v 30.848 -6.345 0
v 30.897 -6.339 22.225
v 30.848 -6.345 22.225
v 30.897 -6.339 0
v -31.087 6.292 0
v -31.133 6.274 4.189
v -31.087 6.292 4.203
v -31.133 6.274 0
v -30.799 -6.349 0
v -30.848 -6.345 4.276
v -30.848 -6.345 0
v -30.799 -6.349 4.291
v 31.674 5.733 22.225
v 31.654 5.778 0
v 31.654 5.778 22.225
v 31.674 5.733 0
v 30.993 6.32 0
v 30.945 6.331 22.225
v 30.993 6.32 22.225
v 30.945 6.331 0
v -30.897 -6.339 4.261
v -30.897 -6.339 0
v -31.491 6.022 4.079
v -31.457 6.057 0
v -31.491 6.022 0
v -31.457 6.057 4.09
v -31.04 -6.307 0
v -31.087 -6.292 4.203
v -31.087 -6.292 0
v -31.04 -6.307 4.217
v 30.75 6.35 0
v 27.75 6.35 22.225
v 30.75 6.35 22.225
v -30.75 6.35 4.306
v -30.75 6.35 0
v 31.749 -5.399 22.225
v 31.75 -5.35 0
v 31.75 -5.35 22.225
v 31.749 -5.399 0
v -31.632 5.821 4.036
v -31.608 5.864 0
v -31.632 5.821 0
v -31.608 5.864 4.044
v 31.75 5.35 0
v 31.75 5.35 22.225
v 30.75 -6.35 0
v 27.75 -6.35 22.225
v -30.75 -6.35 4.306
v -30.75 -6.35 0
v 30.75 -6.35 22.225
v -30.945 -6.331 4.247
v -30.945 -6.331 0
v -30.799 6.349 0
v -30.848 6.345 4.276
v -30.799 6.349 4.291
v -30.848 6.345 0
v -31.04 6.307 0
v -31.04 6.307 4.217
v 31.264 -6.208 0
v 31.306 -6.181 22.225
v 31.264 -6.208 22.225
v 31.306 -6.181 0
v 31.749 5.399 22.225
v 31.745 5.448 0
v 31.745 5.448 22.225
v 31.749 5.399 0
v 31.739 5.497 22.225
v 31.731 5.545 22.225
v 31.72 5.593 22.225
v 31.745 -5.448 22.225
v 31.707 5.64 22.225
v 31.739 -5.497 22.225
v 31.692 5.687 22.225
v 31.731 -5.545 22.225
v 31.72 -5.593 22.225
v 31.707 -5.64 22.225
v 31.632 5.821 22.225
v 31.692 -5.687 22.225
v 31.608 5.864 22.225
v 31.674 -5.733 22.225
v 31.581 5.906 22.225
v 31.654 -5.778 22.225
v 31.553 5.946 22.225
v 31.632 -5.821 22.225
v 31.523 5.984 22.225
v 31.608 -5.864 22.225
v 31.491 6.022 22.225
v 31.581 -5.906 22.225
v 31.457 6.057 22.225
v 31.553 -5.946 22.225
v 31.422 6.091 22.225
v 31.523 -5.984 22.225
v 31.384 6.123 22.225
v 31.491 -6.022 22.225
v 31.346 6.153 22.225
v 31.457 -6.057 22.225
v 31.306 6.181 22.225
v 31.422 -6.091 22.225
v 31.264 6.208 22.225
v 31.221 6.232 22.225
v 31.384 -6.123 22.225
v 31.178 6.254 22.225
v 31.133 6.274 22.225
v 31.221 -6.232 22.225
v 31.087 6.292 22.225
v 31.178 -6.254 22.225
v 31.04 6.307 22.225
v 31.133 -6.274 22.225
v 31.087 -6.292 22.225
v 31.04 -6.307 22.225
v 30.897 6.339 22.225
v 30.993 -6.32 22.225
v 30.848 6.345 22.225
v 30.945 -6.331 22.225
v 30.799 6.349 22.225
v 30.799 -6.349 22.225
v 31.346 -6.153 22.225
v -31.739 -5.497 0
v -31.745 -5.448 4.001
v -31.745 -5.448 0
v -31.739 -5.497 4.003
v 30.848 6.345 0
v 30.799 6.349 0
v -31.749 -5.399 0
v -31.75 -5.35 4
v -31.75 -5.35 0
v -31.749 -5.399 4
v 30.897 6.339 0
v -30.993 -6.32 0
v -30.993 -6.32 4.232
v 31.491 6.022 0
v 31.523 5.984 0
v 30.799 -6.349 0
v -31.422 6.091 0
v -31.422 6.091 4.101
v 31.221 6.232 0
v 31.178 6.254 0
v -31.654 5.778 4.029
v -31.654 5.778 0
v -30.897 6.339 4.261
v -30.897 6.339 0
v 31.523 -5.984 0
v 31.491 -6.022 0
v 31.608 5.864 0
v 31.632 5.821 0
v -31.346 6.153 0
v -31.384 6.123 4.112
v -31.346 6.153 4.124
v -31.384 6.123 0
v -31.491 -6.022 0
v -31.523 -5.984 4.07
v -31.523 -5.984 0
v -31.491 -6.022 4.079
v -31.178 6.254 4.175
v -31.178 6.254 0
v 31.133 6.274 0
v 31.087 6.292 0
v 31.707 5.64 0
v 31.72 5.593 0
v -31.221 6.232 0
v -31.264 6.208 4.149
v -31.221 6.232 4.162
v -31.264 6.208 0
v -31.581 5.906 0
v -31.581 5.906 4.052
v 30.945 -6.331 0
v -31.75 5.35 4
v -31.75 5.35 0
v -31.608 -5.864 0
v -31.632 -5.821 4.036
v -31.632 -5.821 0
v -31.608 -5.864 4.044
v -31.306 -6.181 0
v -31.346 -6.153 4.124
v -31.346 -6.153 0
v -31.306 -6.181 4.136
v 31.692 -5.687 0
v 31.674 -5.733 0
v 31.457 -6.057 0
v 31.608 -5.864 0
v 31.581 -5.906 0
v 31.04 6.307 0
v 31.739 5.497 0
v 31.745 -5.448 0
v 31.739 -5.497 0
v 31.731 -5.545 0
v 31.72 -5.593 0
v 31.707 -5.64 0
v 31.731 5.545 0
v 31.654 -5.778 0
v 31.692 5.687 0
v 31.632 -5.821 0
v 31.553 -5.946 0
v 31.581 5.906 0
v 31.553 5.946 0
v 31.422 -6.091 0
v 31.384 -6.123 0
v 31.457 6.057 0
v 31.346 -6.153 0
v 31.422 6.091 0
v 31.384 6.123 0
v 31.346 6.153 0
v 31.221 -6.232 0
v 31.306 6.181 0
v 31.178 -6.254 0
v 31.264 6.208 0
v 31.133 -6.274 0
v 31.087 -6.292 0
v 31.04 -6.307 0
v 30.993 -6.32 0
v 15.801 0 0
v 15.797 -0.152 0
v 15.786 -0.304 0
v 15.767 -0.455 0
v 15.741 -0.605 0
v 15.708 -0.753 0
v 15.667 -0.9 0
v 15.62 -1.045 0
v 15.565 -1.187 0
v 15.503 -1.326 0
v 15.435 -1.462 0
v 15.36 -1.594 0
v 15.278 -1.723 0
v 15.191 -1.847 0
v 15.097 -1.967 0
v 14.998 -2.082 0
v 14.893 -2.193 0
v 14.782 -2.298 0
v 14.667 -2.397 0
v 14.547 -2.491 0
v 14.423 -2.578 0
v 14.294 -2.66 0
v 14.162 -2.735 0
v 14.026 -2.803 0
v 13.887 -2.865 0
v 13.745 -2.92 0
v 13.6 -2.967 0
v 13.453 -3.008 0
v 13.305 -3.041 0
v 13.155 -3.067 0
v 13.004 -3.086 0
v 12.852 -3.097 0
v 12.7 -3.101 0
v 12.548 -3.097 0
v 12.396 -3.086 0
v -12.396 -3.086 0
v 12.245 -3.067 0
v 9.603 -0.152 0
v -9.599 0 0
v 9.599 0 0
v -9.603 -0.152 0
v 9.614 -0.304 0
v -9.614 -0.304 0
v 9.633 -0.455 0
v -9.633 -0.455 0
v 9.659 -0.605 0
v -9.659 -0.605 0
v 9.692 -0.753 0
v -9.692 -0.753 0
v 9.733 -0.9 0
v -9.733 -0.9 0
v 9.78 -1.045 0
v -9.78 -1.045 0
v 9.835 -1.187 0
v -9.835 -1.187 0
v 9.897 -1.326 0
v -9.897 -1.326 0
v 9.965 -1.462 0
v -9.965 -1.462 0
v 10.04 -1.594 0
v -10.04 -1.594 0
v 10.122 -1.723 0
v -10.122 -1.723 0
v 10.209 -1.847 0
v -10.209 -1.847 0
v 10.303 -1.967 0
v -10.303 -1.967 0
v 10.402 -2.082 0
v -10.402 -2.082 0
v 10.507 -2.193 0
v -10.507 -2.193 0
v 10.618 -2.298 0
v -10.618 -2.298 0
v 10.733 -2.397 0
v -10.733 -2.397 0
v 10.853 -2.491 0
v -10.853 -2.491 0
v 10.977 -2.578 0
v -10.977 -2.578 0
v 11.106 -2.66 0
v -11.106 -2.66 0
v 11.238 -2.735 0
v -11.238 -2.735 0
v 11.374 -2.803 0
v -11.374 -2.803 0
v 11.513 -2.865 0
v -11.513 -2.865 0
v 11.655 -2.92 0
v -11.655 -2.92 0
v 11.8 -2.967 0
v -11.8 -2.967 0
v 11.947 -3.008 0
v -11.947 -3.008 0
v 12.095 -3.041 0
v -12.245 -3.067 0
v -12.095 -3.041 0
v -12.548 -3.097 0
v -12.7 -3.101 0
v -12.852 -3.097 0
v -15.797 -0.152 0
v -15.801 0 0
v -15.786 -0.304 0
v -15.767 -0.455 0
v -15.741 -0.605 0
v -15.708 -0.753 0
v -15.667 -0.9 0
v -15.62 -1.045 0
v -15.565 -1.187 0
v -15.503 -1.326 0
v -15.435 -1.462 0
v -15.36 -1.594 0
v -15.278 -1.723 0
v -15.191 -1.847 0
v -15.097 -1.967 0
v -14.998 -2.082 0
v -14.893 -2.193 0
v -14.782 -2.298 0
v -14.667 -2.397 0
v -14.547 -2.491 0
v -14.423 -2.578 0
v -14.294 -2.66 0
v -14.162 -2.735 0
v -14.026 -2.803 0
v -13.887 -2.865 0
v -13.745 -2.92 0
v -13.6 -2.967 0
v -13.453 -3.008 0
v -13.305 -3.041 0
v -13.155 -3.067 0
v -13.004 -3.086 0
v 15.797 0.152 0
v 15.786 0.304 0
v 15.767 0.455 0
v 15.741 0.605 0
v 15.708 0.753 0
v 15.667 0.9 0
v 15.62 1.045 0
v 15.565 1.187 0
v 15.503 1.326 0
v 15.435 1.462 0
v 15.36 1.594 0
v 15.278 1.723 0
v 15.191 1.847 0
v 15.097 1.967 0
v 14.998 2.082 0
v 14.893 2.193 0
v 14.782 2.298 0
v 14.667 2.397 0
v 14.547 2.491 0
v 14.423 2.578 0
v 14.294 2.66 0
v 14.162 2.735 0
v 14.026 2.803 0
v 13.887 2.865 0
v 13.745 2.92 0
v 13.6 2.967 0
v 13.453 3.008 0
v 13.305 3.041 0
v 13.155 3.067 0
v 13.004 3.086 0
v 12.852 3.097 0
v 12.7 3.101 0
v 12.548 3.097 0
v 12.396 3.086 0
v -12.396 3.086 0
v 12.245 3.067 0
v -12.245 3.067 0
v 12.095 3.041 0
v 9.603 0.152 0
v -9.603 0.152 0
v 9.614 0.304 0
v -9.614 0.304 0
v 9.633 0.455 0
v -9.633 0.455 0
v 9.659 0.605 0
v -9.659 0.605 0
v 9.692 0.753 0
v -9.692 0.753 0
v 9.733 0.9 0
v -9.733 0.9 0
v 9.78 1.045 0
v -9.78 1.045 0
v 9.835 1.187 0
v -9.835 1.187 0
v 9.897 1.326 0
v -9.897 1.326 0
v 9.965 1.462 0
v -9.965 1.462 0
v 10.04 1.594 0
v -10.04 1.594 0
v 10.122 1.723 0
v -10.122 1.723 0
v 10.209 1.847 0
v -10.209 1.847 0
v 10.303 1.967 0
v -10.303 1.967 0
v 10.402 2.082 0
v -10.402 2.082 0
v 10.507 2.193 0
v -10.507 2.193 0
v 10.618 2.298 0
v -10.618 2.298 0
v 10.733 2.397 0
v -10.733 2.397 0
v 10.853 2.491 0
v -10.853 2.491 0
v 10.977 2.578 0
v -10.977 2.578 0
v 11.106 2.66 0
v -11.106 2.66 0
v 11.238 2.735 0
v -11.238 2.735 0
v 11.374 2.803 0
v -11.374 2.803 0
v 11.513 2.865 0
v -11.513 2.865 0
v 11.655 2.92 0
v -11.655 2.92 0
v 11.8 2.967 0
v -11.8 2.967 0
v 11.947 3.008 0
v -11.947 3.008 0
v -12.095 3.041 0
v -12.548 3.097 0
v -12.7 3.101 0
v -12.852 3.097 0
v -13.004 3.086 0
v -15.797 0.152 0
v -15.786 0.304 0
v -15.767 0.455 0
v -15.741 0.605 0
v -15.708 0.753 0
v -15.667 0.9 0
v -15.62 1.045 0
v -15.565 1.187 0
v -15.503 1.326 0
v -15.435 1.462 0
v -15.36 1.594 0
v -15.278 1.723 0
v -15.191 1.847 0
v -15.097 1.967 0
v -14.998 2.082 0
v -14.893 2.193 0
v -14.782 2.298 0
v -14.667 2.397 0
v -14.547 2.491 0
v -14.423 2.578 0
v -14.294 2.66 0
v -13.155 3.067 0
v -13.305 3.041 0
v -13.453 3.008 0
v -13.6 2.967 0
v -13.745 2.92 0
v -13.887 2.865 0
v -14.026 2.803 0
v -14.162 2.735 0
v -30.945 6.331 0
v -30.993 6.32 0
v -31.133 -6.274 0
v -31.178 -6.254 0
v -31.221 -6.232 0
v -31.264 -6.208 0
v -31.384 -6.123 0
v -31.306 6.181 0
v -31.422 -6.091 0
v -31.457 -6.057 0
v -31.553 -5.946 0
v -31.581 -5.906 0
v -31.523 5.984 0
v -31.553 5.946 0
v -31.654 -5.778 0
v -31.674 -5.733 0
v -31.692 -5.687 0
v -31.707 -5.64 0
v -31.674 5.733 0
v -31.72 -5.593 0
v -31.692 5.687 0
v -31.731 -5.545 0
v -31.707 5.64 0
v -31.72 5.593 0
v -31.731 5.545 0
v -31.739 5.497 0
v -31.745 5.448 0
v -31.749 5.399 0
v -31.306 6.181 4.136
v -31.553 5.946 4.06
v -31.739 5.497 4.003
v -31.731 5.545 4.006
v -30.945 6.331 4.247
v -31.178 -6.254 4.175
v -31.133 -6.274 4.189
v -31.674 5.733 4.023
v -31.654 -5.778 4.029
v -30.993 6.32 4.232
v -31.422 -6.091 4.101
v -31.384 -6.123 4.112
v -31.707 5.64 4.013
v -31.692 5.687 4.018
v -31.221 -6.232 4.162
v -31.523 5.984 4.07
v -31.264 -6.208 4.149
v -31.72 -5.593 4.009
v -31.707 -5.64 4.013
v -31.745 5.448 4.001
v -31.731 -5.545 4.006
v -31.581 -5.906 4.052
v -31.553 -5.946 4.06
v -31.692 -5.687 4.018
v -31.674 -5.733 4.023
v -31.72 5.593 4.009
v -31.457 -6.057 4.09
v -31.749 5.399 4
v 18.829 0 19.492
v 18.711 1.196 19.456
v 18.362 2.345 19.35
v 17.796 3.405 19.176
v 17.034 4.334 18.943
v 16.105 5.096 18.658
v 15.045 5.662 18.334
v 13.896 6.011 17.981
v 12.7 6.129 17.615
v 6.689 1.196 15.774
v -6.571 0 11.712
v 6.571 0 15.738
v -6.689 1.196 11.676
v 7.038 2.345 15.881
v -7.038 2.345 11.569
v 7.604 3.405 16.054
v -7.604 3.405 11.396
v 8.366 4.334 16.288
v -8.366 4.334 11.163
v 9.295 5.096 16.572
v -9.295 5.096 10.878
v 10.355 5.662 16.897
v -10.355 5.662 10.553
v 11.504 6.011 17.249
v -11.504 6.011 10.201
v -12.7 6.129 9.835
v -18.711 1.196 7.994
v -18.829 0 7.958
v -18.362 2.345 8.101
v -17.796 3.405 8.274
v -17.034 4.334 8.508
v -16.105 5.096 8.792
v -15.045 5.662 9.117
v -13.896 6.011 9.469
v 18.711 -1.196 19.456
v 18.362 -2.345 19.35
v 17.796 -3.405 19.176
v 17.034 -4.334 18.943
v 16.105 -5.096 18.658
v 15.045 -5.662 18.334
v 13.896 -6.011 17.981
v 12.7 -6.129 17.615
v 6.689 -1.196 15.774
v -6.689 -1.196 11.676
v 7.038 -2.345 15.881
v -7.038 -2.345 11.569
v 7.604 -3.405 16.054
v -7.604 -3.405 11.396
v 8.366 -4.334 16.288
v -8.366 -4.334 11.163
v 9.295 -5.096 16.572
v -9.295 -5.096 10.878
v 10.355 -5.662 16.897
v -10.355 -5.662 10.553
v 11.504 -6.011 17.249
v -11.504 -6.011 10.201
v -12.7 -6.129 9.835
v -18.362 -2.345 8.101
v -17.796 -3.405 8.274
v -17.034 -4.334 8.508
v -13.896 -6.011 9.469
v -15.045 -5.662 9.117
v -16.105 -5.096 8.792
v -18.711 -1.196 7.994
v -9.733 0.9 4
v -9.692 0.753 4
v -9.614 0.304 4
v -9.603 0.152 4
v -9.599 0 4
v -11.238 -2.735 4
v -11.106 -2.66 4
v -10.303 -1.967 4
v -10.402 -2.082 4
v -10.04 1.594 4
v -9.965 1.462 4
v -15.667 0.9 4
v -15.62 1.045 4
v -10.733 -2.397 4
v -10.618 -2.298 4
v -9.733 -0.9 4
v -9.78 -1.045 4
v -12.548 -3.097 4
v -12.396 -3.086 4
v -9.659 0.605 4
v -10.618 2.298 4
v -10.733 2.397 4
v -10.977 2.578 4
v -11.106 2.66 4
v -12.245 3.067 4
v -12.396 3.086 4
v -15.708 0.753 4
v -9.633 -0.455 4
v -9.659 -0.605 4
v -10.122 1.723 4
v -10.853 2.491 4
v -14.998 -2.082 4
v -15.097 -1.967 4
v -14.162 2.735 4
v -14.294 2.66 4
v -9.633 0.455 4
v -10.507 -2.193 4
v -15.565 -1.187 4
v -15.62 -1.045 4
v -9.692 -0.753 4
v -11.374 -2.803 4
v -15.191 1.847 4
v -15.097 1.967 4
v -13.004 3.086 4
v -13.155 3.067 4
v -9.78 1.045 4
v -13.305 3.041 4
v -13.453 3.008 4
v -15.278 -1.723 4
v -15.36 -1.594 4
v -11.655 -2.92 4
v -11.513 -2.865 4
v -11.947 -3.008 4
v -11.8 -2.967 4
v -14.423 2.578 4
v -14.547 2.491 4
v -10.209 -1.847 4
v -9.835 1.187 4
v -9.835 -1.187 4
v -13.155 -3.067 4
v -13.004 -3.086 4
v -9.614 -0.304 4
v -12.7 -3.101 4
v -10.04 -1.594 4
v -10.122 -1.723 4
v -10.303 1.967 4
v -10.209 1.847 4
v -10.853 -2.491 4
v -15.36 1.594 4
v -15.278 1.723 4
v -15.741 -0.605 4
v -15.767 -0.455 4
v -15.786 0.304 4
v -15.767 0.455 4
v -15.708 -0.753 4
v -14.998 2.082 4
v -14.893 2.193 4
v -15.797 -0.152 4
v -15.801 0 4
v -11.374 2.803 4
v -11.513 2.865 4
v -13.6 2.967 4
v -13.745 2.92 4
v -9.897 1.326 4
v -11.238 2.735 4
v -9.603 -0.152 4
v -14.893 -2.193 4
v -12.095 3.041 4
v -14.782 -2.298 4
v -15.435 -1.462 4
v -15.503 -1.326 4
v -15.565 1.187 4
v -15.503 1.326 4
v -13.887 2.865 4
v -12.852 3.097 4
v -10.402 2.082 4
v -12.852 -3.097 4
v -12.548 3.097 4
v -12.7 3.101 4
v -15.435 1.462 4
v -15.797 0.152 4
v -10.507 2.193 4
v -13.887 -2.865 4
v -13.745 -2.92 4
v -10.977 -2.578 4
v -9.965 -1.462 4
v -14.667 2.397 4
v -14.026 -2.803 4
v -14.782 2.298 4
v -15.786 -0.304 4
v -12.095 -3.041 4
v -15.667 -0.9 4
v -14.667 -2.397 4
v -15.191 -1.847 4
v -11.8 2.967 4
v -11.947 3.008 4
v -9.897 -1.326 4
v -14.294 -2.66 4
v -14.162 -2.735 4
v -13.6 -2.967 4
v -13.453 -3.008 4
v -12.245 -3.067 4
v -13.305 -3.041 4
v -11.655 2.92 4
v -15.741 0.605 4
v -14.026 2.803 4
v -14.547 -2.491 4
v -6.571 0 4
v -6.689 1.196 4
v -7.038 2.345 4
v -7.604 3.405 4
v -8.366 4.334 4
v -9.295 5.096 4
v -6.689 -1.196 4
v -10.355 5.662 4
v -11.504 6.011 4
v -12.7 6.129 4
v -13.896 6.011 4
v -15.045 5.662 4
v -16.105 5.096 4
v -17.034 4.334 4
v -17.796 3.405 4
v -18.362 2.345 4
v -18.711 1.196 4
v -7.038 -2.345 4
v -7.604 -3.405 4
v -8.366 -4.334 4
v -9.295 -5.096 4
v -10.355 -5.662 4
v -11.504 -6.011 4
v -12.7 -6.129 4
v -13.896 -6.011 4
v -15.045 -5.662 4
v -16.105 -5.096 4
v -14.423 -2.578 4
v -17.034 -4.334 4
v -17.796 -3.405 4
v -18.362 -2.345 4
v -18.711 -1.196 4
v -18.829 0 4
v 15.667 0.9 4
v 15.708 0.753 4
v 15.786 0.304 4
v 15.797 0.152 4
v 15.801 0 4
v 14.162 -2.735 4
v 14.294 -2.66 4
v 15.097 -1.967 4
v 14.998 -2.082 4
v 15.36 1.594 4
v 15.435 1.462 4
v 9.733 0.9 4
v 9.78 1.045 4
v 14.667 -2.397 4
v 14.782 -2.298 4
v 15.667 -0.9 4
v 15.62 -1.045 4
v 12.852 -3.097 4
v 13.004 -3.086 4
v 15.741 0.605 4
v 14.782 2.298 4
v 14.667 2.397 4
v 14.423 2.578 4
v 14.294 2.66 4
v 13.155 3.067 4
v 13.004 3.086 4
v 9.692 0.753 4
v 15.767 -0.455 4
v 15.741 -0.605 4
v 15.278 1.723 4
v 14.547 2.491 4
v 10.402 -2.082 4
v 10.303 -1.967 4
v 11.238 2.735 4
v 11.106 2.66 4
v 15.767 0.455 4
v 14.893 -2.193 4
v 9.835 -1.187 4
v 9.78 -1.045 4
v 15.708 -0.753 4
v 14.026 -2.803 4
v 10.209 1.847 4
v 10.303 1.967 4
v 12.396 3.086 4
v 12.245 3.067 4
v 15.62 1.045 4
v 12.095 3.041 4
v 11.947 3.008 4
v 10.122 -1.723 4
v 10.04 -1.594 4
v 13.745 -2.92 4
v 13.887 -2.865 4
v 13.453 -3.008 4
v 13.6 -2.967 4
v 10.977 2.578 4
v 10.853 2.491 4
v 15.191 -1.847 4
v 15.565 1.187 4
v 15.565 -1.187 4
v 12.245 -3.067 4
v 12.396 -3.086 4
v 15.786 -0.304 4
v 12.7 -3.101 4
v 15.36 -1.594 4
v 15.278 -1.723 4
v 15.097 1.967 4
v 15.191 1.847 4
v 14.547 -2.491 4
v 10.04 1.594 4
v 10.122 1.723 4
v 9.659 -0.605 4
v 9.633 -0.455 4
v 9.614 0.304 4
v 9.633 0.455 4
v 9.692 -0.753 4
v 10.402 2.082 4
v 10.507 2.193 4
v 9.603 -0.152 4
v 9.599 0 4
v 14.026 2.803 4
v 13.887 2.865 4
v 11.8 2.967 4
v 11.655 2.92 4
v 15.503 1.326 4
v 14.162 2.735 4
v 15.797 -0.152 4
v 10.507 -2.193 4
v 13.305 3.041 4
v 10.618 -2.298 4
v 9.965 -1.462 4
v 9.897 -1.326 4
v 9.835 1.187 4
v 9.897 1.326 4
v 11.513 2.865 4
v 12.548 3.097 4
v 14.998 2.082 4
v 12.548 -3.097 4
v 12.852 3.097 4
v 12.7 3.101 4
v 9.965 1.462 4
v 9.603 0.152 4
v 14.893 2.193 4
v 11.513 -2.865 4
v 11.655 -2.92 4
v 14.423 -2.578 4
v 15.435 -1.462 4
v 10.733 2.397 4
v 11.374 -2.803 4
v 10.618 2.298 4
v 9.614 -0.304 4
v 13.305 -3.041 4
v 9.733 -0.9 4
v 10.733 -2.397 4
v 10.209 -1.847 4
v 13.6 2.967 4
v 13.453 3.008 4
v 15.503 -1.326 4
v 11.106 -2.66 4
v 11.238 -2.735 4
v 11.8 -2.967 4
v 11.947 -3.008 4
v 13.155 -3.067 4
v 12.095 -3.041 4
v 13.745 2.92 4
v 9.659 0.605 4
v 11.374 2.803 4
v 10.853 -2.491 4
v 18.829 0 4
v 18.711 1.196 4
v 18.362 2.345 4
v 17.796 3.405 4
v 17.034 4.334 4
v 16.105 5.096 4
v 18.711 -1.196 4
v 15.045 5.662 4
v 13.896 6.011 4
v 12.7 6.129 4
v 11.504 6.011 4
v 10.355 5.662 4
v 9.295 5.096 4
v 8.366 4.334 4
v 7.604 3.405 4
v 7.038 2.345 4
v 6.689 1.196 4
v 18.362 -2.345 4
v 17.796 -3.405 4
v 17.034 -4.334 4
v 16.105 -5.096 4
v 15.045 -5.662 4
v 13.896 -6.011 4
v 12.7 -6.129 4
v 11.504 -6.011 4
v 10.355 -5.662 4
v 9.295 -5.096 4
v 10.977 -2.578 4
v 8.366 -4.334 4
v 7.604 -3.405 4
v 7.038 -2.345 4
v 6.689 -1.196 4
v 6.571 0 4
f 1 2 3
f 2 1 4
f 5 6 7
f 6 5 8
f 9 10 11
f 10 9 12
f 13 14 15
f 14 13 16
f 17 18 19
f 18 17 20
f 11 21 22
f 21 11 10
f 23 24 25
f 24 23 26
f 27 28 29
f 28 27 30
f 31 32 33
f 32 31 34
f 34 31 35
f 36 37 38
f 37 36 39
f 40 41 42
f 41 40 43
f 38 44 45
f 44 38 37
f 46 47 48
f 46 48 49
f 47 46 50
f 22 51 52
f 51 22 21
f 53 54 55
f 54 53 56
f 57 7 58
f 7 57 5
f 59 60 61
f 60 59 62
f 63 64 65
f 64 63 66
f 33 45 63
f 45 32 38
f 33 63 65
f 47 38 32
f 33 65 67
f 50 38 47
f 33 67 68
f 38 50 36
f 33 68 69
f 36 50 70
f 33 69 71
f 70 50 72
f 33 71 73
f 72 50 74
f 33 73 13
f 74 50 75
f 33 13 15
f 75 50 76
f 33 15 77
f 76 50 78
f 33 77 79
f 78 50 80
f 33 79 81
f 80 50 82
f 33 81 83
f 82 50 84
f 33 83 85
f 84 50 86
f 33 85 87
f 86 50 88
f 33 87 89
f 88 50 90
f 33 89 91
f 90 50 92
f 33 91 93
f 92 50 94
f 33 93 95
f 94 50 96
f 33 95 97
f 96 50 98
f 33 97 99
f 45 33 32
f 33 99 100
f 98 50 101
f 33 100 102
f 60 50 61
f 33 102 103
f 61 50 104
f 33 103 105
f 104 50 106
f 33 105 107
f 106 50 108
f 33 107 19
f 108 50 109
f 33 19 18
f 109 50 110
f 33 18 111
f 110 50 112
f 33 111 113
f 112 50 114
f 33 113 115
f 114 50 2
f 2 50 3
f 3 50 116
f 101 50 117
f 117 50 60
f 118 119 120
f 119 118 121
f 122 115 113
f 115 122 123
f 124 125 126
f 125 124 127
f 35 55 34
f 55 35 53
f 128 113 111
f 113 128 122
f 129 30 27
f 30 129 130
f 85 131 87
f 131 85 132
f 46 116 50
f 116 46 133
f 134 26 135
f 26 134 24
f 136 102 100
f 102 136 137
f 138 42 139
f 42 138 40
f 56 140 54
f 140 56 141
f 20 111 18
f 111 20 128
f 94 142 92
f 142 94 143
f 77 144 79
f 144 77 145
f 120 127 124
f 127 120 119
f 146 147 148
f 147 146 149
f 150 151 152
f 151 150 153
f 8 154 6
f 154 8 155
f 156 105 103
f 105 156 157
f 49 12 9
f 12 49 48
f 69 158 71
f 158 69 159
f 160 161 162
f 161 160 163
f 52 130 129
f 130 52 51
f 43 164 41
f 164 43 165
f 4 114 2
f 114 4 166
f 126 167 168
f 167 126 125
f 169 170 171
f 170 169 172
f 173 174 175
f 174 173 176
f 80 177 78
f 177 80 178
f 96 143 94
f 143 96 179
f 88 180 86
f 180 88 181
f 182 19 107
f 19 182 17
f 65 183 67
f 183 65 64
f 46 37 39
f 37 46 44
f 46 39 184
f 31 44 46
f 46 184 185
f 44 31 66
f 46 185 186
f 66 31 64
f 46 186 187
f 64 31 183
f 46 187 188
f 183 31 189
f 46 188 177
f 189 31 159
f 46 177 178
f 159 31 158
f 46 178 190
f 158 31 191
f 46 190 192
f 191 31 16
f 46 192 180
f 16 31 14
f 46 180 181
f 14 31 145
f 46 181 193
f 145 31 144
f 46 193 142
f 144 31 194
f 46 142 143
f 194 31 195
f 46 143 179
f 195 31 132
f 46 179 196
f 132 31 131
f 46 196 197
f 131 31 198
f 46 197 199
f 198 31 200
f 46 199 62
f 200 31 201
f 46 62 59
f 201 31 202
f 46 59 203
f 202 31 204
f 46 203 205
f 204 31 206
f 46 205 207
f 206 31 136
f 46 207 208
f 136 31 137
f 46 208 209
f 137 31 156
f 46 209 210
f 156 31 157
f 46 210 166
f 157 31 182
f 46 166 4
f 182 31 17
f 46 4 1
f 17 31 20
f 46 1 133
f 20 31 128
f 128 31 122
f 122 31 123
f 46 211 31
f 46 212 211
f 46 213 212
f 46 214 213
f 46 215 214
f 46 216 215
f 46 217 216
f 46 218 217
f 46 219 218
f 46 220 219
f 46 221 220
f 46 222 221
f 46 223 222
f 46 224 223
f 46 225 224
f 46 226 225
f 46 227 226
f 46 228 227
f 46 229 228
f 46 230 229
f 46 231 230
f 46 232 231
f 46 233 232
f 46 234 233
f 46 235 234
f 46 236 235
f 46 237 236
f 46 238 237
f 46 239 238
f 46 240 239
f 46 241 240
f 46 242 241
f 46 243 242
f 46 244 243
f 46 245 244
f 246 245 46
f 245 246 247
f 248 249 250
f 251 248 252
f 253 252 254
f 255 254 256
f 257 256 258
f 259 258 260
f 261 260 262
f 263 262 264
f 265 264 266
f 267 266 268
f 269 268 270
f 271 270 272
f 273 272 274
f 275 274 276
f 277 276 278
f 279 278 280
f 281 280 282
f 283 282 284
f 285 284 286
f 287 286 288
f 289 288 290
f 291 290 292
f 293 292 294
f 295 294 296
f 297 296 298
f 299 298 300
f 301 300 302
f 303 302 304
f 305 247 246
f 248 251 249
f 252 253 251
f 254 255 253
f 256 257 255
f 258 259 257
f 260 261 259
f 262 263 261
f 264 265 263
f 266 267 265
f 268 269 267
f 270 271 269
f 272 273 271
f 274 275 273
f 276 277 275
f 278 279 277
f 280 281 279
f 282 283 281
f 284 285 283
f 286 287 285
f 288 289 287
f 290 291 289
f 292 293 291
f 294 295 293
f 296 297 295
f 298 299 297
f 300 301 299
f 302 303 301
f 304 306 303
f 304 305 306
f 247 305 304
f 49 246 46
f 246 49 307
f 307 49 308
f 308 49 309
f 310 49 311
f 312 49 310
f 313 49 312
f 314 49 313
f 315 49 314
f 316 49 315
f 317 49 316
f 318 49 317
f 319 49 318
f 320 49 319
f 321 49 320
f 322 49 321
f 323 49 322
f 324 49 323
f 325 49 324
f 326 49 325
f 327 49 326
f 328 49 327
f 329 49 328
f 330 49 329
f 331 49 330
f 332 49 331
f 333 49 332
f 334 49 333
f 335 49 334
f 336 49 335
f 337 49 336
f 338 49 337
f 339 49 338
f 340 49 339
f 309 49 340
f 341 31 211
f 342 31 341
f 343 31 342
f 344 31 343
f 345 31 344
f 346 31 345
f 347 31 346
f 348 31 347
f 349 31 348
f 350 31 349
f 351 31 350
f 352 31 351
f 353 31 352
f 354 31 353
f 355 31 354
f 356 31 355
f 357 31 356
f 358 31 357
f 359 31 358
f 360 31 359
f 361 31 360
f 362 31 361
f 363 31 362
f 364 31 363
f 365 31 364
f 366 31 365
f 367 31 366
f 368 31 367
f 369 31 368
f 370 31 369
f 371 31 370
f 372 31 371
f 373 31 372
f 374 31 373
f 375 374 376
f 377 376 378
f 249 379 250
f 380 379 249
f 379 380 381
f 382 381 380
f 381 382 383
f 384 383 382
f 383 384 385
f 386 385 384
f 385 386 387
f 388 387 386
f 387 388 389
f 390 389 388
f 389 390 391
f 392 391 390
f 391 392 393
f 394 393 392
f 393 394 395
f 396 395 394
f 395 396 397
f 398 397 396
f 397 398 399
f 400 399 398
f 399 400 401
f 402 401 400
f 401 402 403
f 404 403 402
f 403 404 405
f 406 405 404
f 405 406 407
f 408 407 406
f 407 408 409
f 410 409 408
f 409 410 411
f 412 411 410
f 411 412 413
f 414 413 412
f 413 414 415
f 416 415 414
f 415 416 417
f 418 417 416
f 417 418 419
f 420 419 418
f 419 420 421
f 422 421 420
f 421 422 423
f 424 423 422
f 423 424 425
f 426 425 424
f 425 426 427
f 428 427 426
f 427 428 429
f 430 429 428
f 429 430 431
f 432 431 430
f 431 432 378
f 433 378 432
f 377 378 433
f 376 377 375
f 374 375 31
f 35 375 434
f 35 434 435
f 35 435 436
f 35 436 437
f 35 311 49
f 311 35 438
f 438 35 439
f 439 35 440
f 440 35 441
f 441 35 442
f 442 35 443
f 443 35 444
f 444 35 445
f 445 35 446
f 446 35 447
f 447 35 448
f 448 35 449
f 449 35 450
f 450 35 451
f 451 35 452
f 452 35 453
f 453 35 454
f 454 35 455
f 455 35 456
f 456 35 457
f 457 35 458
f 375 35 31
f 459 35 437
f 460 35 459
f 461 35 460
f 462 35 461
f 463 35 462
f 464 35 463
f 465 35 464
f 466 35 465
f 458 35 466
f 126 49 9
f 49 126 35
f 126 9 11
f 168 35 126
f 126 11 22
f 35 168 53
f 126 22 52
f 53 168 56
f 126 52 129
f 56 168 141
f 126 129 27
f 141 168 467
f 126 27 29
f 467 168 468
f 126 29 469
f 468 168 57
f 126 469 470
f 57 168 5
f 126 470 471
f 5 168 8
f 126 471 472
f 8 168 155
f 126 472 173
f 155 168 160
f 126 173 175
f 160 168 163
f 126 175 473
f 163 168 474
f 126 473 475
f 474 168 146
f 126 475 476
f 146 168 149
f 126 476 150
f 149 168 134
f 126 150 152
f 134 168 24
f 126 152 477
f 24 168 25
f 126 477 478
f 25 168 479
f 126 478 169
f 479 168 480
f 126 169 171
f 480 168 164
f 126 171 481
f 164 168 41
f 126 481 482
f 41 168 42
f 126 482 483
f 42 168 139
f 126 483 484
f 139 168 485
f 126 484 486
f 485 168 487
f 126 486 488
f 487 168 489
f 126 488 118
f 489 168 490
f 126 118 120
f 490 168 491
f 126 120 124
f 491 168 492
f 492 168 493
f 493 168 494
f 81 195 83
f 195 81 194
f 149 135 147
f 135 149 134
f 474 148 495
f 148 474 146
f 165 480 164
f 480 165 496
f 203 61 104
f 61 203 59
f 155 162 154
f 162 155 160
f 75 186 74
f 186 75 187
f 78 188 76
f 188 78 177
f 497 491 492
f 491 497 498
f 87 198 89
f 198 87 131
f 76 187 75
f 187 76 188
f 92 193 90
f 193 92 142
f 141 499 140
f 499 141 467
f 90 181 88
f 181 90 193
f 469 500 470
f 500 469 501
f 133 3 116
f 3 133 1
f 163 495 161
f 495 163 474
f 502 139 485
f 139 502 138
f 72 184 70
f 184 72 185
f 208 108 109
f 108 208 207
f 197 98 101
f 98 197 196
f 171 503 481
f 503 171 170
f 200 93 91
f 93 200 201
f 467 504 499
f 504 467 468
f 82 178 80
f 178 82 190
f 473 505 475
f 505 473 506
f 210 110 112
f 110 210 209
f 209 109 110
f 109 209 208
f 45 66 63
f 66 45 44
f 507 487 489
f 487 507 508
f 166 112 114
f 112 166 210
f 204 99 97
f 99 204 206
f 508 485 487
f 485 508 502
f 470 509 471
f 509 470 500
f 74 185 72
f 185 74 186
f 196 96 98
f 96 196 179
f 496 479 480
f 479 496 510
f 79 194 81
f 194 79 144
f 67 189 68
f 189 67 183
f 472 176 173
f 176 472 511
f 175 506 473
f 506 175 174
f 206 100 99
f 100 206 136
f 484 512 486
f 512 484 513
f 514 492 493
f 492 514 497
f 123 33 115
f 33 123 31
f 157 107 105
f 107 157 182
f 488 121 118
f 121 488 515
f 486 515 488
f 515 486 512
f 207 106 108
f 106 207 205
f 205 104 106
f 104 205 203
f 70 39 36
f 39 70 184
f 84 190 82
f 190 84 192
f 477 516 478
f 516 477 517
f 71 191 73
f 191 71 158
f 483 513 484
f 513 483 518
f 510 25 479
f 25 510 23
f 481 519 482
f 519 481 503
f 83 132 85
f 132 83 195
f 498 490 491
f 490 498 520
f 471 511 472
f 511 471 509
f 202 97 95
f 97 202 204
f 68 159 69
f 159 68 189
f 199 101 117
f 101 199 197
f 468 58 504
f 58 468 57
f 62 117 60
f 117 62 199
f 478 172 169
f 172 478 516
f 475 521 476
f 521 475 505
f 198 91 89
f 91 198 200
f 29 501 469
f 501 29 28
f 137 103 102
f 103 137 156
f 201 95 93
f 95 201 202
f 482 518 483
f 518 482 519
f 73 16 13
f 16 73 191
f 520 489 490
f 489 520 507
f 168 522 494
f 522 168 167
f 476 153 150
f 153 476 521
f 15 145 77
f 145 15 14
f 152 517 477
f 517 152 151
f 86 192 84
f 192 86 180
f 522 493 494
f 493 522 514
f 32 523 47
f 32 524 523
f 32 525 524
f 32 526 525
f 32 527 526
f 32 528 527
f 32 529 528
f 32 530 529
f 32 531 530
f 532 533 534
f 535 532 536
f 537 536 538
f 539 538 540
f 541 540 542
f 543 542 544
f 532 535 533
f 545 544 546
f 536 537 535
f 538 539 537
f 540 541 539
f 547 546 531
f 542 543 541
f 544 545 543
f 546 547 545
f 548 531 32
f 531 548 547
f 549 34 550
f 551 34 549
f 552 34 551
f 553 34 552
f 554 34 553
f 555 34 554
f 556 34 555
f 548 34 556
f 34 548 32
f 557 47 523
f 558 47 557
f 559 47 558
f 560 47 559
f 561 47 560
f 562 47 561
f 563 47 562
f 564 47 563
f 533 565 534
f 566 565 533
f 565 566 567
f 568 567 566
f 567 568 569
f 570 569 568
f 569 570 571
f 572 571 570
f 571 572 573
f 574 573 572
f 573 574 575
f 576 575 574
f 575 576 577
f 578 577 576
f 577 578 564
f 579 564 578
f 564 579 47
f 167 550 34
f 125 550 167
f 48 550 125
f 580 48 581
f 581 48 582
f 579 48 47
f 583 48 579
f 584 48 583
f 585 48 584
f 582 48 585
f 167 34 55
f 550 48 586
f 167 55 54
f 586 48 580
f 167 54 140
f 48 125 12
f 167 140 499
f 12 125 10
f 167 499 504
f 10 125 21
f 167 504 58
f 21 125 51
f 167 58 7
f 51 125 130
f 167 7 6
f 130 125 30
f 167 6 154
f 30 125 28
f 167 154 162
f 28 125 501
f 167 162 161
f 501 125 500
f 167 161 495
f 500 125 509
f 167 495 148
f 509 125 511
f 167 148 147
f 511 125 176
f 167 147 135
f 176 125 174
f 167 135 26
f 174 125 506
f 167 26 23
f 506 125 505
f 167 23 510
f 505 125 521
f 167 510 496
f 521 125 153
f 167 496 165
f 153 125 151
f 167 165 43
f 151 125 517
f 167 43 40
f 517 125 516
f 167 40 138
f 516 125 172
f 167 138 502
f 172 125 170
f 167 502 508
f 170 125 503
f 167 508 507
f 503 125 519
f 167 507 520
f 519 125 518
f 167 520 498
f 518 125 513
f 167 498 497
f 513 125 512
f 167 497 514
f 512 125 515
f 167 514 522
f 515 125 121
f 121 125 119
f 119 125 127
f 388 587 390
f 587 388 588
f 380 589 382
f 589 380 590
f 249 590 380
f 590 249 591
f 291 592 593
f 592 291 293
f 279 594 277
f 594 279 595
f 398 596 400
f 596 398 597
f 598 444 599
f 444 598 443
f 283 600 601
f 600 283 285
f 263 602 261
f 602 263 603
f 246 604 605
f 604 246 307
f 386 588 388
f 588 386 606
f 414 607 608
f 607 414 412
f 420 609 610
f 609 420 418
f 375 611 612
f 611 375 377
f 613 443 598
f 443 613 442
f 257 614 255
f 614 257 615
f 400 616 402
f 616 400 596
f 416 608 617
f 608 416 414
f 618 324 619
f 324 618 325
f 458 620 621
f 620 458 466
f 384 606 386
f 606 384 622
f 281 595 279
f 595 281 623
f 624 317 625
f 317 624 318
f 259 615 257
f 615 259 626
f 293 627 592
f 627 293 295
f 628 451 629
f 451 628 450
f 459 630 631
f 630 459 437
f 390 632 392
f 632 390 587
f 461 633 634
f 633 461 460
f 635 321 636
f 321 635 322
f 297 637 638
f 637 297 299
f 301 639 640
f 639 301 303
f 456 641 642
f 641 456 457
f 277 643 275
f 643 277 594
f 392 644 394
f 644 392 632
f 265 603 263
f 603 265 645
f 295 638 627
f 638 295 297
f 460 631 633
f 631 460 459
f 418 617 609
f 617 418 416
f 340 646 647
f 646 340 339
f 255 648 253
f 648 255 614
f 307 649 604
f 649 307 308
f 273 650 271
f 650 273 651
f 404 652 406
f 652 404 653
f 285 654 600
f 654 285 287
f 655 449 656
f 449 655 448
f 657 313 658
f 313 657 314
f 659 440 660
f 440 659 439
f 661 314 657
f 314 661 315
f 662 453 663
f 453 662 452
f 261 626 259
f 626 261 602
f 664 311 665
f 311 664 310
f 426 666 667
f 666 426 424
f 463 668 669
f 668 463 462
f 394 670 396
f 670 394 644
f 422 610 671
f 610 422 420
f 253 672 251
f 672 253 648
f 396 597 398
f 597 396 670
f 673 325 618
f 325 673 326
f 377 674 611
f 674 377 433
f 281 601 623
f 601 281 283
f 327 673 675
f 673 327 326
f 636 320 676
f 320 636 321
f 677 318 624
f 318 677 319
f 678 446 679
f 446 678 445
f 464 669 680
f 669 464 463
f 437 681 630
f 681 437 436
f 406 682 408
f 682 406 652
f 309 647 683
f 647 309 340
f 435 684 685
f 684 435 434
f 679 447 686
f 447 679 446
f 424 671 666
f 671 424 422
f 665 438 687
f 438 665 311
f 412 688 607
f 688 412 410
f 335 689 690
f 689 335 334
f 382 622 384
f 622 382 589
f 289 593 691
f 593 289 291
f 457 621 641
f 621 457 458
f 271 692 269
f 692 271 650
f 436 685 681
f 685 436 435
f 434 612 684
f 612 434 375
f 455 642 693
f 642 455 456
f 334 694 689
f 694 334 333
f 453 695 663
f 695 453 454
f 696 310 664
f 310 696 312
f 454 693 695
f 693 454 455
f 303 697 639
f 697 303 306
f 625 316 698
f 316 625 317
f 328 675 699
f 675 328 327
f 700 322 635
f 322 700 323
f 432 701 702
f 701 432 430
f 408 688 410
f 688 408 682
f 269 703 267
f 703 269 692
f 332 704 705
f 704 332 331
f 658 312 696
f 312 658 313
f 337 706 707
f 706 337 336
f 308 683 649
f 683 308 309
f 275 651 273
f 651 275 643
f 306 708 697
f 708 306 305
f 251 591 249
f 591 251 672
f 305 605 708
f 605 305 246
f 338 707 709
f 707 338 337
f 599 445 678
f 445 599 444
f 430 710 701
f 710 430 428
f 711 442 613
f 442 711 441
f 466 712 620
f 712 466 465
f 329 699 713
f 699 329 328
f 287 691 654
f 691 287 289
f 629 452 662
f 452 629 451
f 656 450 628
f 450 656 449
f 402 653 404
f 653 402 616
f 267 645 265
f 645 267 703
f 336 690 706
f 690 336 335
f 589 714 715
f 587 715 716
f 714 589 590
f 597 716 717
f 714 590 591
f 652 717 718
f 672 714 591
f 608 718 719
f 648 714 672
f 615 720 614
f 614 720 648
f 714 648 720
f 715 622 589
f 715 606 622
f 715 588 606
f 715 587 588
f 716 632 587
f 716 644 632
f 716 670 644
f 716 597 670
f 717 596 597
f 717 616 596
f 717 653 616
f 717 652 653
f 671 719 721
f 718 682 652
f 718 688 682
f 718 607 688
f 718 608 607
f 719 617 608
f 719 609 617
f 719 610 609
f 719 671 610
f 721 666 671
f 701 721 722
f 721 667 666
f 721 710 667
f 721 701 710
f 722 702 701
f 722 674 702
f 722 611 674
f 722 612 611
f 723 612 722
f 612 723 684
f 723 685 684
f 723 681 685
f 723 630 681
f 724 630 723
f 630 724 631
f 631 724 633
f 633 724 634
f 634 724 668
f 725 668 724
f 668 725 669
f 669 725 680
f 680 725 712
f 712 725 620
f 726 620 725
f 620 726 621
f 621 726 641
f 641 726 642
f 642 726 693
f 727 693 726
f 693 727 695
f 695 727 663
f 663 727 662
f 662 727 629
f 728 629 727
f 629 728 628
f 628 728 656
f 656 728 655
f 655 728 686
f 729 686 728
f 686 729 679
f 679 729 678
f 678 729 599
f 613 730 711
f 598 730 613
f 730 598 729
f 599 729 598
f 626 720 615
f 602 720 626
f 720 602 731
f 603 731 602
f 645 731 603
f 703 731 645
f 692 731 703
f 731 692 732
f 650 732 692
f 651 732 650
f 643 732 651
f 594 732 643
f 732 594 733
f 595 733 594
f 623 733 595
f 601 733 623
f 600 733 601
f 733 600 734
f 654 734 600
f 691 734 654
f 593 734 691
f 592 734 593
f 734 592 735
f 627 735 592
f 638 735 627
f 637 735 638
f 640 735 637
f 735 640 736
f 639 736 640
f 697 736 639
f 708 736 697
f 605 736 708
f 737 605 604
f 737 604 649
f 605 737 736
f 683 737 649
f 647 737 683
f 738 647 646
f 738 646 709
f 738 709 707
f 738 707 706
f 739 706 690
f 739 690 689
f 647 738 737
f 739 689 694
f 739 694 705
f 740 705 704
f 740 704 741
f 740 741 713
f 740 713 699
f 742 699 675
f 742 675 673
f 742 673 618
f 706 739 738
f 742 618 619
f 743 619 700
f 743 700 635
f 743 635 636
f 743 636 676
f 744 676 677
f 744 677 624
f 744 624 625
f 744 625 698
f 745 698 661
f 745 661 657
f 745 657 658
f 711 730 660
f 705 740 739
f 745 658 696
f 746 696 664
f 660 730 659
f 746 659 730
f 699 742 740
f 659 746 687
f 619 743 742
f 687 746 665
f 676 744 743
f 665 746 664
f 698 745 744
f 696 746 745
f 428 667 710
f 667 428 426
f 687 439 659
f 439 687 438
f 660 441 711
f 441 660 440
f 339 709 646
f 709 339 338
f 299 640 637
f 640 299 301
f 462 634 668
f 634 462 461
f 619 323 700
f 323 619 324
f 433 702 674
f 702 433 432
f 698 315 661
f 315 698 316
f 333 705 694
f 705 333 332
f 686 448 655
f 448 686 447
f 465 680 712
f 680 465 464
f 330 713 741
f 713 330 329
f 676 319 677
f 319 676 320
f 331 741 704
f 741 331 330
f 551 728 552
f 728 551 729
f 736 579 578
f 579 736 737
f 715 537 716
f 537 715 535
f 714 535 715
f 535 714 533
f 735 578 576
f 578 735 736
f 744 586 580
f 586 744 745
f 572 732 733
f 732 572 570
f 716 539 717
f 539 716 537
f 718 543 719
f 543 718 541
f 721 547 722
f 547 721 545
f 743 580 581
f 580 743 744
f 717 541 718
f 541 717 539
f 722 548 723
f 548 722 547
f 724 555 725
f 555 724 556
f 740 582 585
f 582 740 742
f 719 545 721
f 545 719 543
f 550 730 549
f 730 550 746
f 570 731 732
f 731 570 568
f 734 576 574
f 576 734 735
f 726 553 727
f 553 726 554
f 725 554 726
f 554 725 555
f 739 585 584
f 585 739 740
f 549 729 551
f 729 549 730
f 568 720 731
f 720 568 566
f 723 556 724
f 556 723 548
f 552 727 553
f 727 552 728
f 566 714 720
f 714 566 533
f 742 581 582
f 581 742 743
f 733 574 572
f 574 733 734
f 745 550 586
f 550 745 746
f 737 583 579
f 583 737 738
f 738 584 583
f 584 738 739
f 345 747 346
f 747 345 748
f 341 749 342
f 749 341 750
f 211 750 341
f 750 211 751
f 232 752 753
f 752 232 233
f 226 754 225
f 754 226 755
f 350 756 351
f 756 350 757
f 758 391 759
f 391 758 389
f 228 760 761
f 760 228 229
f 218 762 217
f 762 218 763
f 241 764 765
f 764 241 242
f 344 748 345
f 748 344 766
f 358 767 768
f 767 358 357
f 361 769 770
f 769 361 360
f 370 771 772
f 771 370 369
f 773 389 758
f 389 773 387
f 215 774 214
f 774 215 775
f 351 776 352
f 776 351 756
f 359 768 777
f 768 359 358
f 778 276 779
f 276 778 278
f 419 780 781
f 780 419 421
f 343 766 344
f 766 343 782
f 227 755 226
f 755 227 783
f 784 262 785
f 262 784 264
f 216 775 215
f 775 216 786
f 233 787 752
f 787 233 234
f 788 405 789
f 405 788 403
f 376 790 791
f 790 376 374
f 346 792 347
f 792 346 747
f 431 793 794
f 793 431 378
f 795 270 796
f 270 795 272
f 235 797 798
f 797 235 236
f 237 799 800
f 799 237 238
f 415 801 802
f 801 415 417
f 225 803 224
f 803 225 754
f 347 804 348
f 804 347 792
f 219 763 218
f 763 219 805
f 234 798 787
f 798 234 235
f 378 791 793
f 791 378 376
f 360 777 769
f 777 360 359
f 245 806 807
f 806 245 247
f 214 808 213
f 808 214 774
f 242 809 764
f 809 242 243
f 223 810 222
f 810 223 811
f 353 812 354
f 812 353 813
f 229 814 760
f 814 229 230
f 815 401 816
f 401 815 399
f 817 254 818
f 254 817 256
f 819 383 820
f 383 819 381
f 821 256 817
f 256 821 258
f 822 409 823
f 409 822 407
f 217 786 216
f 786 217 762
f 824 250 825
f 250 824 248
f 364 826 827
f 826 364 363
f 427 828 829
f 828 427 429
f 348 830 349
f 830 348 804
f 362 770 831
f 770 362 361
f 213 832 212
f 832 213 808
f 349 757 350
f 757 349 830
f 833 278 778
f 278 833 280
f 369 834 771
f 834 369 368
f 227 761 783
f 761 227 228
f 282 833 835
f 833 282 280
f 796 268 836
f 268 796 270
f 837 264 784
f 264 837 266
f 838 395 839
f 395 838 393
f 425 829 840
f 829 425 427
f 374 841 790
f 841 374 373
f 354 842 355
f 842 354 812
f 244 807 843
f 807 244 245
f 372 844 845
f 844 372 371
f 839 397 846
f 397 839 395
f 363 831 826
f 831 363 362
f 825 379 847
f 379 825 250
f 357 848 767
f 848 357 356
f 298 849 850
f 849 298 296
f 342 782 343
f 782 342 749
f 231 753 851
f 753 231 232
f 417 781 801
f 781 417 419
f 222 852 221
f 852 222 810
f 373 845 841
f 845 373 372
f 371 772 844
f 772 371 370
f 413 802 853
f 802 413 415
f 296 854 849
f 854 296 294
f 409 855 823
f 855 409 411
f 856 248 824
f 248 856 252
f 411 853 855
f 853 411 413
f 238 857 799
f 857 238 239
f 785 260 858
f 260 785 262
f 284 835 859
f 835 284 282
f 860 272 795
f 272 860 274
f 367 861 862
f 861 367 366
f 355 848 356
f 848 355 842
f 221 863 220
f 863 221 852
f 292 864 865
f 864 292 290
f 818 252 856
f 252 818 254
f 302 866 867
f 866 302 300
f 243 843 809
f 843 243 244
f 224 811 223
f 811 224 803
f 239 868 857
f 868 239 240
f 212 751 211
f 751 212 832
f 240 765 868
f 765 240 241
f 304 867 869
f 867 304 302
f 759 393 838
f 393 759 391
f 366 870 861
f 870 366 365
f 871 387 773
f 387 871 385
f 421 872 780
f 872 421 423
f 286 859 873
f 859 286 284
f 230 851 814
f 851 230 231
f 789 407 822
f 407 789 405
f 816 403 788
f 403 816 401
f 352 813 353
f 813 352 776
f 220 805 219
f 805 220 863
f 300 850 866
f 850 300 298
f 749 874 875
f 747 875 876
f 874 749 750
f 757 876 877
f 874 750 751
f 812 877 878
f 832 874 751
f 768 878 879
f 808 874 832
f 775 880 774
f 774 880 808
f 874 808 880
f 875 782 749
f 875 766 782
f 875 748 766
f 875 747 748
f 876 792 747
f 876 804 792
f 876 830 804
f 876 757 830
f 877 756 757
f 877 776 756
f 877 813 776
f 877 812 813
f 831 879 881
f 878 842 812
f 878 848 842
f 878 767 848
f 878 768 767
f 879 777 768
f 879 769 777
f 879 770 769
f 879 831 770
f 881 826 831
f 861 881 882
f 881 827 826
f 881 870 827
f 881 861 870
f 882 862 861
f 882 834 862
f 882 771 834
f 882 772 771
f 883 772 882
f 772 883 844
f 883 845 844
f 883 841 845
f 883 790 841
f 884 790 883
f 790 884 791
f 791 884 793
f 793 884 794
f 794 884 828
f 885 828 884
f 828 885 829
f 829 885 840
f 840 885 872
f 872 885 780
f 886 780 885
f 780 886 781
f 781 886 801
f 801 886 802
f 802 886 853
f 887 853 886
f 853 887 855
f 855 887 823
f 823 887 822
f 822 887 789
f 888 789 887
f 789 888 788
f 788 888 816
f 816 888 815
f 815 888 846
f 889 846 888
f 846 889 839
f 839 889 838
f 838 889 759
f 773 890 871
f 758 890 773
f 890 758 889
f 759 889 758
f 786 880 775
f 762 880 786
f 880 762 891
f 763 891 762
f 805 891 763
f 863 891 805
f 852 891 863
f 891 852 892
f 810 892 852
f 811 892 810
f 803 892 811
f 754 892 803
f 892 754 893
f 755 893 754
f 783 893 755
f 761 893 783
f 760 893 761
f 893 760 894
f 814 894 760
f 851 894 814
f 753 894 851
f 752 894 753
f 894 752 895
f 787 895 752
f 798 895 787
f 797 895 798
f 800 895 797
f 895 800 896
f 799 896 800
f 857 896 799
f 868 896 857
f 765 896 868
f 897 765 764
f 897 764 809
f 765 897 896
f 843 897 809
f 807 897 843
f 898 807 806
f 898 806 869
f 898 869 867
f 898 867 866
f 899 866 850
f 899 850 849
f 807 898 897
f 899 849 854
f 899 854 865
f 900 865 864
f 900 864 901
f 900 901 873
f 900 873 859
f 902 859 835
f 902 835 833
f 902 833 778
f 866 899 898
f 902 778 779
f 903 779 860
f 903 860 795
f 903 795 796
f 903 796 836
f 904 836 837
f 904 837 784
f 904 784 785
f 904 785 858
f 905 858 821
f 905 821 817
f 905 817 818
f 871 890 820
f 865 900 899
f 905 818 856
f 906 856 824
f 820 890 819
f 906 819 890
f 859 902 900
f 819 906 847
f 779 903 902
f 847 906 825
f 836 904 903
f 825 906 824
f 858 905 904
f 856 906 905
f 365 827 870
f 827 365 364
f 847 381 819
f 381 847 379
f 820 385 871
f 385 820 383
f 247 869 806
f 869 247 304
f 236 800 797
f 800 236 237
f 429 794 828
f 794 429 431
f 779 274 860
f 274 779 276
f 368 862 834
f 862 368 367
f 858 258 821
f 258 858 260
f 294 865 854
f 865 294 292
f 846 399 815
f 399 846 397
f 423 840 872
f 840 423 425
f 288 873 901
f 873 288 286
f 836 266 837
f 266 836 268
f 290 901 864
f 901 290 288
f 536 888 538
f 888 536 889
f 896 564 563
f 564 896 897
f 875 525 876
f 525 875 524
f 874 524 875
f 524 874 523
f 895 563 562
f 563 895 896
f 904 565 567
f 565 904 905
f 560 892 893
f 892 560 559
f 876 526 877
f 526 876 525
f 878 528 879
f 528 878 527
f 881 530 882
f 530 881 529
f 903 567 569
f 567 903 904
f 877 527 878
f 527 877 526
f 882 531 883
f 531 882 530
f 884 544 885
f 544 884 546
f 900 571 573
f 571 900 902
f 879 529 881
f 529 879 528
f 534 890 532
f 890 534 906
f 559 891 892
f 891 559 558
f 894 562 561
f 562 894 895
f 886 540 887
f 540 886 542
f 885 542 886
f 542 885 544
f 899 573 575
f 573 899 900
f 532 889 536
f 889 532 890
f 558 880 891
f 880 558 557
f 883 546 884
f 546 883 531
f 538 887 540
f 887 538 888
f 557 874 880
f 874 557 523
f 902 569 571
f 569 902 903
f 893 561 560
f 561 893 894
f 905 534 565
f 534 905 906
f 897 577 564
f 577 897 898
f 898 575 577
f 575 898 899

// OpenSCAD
// file: zcube.scad
$fn = $preview ? 24 : 128;

// This function creates a cube with a given x/y either above (f=1) or below (f=-1) the z axis.
module zcube(dimensions, z=0, f=1) {
	translate([0, 0, dimensions[2]/2 * f + z]) cube(dimensions, true);
}

module zring(dimensions, thickness, z=0, f=1) {
	render() difference() {
		zcube([dimensions[0]+thickness/2, dimensions[1]+thickness/2, dimensions[2]], z=z, f=f);
		zcube([dimensions[0]-thickness/2, dimensions[1]-thickness/2, dimensions[2]], z=z, f=f);
	}
}

module rcube(dimensions, d = 1, z=0, f=1) {
	dx = dimensions[0]/2 - d/2;
	dy = dimensions[1]/2 - d/2;
	dz = dimensions[2]/2 * (f-1) + z;
	
	hull() {
		translate([-dx, -dy, dz]) cylinder(h=dimensions[2], d=d);
		translate([-dx, dy, dz]) cylinder(h=dimensions[2], d=d);
		translate([dx, -dy, dz]) cylinder(h=dimensions[2], d=d);
		translate([dx, dy, dz]) cylinder(h=dimensions[2], d=d);
	}
}

module zcorners() {
	children();
	mirror([1, 0, 0]) children();
	mirror([0, 1, 0]) children();
	mirror([1, 0, 0]) mirror([0, 1, 0]) children();
}

module reflect(axis = [1, 0, 0]) {
	children();
	mirror(axis) children();
}

module zsides(dimensions, thickness, inset=0) {
	difference() {
		zcube(dimensions + [thickness*2, thickness*2, 0]);
		zcube(dimensions);
	}
}
// file: bolts.scad
$radial_error = 0.1;

$fn = $preview ? 24 : 128;

ISO262_COARSE_PITCH = [
	[1.0, 0.25],
	[1.2, 0.25],
	[1.4, 0.2],
	[1.6, 0.35],
	[1.8, 0.2],
	[2.0, 0.4],
	[2.5, 0.45],
	[3.0, 0.5],
	[3.5, 0.35],
	[4.0, 0.7],
	[5.0, 0.8],
	[6.0, 1.0],
	[7.0, 0.75],
	[8.0, 1.25],
	[10.0, 1.5],
	[12.0, 1.75],
	[14.0, 1.5],
	[16.0, 2.0],
	[30.0, 3.5],
	[42.0, 4.5],
	[56.0, 5.5]
];

function screw_pitch(d) = lookup(d, ISO262_COARSE_PITCH);

function fudge_factor(fn=$fn) = 1/cos(180/fn);
function outer_radius(radius, fn=$fn, radial_error=$radial_error) = radius*fudge_factor(fn)+radial_error;

module sphere_outer(radius, fn=$fn, radial_error=$radial_error) {
	sphere(r=radius*fudge_factor(fn)+radial_error, $fn=fn);
}

module cylinder_outer(height, radius, fn=$fn, radial_error=$radial_error) {
	cylinder(h=height,r=radius*fudge_factor(fn)+radial_error, $fn=fn);
}

module cylinder_inner(height, radius, fn=$fn, radial_error=$radial_error) {
	cylinder(h=height,r=radius-radial_error,$fn=fn);
}

// Make a hole. The diameter is the size of the screw (e.g. 3 for M3). Depth is how far the hole should go for the thread, and inset is how far out there should be a hole for the head to go.
module hole(diameter=3, depth=6, inset=10, pitch=0) {
	cylinder_outer(depth, (diameter-pitch)/2);
	
	if (inset) {
		translate([0, 0, depth]) cylinder_outer(inset, diameter, 32);
	}
}

module threaded_hole(diameter=3, depth=6, inset=10) {
	hole(diameter, depth, inset, screw_pitch(diameter));
}

module screw_hole(diameter = 3, depth = 16, inset = 10, thickness = 6) {
	insert = depth - thickness;
	pitch = screw_pitch(diameter);
	
	// The part that the screw will thread into:
	cylinder_outer(insert, (diameter-pitch)/2);
	
	translate([0, 0, insert])
	hole(diameter, depth - insert, inset);
}

module countersunk_screw_hole(diameter = 3, depth = 16, inset = 10, thickness = 6) {
	insert = depth - thickness;
	pitch = screw_pitch(diameter);
	
	// The part that the screw will thread into:
	cylinder_outer(insert, (diameter-pitch)/2);
	
	translate([0, 0, insert])
	countersunk_hole(diameter, depth - insert, inset);
}

module countersunk_hole(diameter=3, depth=6, inset=10, pitch=0, radial_error=$radial_error) {
	hole(diameter, depth, inset, pitch);
	translate([0, 0, depth-diameter/2]) cylinder(r1=diameter/2+radial_error, r2=diameter+radial_error, h=diameter/2);
}

module knurled_insert(diameter = 3, depth = 6, thickness = 1) {
	cylinder_inner(depth, diameter/2 + thickness);
}

module knurled_hole(diameter = 3, depth = 6, inset = 10, insert = 4, thickness = 1) {
	hole(diameter, depth, inset);
	
	knurled_insert(diameter, insert, thickness);
}

module countersunk_knurled_hole(diameter = 3, depth = 6, inset = 10, insert = 4, thickness = 1) {
	countersunk_hole(diameter, depth, inset);
	
	knurled_insert(diameter, insert, thickness);
}

// Make a hole for a bolt/screw combination.
module bolted_hole(diameter=3, depth=8, nut_offset=2, shaft_length=10, inset=10) {
	hole(diameter, depth, inset);
	hull() {
		shaft_width = diameter;
		translate([0, 0, nut_offset]) rotate(360/12, [0, 0, 1]) cylinder_outer(diameter, shaft_width, 6);
		translate([0, shaft_length, nut_offset]) rotate(360/12, [0, 0, 1]) cylinder_outer(diameter, shaft_width, 6);
	}
}

module countersunk_bolted_hole(diameter=3, depth=8, nut_offset=2, shaft_length=10, inset=10) {
	countersunk_hole(diameter, depth, inset);
	hull() {
		shaft_width = diameter;
		translate([0, 0, nut_offset]) rotate(360/12, [0, 0, 1]) cylinder_outer(diameter, shaft_width, 6);
		translate([0, shaft_length, nut_offset]) rotate(360/12, [0, 0, 1]) cylinder_outer(diameter, shaft_width, 6);
	}
}

module mounting_hole(diameter=3, depth=6, inset=10, outset=3) {
	difference() {
		cylinder_outer(depth, diameter/2+outset);
		hole(diameter=diameter, depth=depth, inset=inset);
	}
}

!render() rotate(90, [1, 0, 0]) difference() {
	cube([40, 10, 10]);
	translate([5, 5, 0]) screw_hole();
}

render() rotate(90, [1, 0, 0]) difference() {
	cube([40, 10, 10]);
	translate([5, 5, 0]) bolted_hole(diameter=3, depth=8);
	translate([15, 5, 0]) bolted_hole(diameter=4, depth=8);
	translate([25, 5, 0]) countersunk_hole(diameter=4, depth=8);
	translate([35, 5, 0]) knurled_hole();
}

render() rotate(90, [1, 0, 0]) difference() {
	cube([6*4, 12, 12]);
	translate([6, 6, 0]) hole(diameter=5, depth=8);
	translate([6*3, 6, 0]) hole(diameter=5.5, depth=8);
}
// main file
use <bolts.scad>;
use <zcube.scad>;

$fs = 0.1;

hole_width = 25.4 / 2; // 1/2 inch.
hole_diameter = 25.4 / 4; // 1/4 inch.

rack_unit = 25.4 * (7/8);
rack_unit_hole_spacing = 25.4 * 0.625;

module bracket() {
	difference() {
		intersection() {
			rcube([hole_width * 5, hole_width, rack_unit], d=2);
			
			hull() {
				zcube([hole_width * 5, hole_width, 4]);
				
				translate([hole_width * 2.5 - 2, 0, 0])
				zcube([4, hole_width, rack_unit]);
			}
		}
		
		translate([hole_width*-1, 0, 0]) hole(6, 4, inset=rack_unit);
		translate([hole_width*1, 0, 0]) hole(6, 4, inset=rack_unit);
	}
}

bracket();
